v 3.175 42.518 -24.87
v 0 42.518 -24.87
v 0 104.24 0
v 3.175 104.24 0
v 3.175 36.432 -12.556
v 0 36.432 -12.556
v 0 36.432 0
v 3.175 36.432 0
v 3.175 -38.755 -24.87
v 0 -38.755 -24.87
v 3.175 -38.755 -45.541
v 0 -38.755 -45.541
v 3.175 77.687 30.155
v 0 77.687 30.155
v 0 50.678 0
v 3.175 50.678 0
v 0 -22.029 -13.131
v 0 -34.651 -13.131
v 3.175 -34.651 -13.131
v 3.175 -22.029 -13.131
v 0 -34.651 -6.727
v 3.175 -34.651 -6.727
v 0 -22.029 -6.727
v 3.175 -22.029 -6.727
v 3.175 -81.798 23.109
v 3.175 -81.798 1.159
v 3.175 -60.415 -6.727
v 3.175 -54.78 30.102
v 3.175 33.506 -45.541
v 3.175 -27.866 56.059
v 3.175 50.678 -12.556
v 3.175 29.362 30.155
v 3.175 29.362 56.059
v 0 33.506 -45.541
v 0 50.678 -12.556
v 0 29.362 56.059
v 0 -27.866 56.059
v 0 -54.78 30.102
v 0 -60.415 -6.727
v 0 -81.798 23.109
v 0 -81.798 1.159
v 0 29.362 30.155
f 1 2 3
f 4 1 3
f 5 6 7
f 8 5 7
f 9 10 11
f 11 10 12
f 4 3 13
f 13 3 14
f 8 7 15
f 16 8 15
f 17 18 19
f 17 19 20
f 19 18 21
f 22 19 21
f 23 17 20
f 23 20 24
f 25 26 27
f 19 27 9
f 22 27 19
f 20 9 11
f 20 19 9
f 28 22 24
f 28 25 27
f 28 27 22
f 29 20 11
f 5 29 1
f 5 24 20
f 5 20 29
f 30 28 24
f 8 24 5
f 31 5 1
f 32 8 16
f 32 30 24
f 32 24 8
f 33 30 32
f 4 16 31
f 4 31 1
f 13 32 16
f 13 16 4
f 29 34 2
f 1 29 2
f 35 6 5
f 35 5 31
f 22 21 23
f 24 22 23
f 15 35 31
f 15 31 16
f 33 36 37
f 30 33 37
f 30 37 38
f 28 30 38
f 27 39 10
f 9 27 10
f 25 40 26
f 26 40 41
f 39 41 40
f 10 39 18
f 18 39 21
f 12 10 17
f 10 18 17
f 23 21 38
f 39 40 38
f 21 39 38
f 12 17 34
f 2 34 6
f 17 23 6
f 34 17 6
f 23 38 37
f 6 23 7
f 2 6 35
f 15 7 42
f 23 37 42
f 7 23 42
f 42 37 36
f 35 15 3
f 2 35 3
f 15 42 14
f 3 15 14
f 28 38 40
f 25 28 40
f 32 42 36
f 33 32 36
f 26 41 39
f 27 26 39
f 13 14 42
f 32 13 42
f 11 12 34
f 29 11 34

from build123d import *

# Parameters (mm, degrees)
F1_W     = 12.621125
F1_H     = 6.403833
F1_W_2   = 14.245306
F1_H_2   = 12.555593
F0_DEPTH = 3.175


with BuildPart() as f0:
    # F1 (on Right) → F0 (new body)
    with BuildSketch(Plane.YZ):
        Polygon((-27.865971, 56.059395), (-54.780164, 30.102129), (-81.797782, 23.108517), (-81.797782, 1.158869), (-60.415494, -6.72708), (-38.755445, -24.869703), (-38.755445, -45.540605), (0.748058, -45.540605), (0.748058, 56.059395), align=None)
        with Locations((-28.339945, -9.928997)):
            Rectangle(F1_W, F1_H, mode=Mode.SUBTRACT)
        Polygon((29.362087, 56.059395), (0.748058, 56.059395), (0.748058, -45.540605), (12.285572, -45.540605), (33.50626, -45.540605), (42.517703, -24.869703), (104.240472, 0), (77.687405, 30.154637), (29.362087, 30.154637), align=None)
        with Locations((43.55493, -6.277797)):
            Rectangle(F1_W_2, F1_H_2, mode=Mode.SUBTRACT)
    extrude(amount=F0_DEPTH)


solid = f0.part
